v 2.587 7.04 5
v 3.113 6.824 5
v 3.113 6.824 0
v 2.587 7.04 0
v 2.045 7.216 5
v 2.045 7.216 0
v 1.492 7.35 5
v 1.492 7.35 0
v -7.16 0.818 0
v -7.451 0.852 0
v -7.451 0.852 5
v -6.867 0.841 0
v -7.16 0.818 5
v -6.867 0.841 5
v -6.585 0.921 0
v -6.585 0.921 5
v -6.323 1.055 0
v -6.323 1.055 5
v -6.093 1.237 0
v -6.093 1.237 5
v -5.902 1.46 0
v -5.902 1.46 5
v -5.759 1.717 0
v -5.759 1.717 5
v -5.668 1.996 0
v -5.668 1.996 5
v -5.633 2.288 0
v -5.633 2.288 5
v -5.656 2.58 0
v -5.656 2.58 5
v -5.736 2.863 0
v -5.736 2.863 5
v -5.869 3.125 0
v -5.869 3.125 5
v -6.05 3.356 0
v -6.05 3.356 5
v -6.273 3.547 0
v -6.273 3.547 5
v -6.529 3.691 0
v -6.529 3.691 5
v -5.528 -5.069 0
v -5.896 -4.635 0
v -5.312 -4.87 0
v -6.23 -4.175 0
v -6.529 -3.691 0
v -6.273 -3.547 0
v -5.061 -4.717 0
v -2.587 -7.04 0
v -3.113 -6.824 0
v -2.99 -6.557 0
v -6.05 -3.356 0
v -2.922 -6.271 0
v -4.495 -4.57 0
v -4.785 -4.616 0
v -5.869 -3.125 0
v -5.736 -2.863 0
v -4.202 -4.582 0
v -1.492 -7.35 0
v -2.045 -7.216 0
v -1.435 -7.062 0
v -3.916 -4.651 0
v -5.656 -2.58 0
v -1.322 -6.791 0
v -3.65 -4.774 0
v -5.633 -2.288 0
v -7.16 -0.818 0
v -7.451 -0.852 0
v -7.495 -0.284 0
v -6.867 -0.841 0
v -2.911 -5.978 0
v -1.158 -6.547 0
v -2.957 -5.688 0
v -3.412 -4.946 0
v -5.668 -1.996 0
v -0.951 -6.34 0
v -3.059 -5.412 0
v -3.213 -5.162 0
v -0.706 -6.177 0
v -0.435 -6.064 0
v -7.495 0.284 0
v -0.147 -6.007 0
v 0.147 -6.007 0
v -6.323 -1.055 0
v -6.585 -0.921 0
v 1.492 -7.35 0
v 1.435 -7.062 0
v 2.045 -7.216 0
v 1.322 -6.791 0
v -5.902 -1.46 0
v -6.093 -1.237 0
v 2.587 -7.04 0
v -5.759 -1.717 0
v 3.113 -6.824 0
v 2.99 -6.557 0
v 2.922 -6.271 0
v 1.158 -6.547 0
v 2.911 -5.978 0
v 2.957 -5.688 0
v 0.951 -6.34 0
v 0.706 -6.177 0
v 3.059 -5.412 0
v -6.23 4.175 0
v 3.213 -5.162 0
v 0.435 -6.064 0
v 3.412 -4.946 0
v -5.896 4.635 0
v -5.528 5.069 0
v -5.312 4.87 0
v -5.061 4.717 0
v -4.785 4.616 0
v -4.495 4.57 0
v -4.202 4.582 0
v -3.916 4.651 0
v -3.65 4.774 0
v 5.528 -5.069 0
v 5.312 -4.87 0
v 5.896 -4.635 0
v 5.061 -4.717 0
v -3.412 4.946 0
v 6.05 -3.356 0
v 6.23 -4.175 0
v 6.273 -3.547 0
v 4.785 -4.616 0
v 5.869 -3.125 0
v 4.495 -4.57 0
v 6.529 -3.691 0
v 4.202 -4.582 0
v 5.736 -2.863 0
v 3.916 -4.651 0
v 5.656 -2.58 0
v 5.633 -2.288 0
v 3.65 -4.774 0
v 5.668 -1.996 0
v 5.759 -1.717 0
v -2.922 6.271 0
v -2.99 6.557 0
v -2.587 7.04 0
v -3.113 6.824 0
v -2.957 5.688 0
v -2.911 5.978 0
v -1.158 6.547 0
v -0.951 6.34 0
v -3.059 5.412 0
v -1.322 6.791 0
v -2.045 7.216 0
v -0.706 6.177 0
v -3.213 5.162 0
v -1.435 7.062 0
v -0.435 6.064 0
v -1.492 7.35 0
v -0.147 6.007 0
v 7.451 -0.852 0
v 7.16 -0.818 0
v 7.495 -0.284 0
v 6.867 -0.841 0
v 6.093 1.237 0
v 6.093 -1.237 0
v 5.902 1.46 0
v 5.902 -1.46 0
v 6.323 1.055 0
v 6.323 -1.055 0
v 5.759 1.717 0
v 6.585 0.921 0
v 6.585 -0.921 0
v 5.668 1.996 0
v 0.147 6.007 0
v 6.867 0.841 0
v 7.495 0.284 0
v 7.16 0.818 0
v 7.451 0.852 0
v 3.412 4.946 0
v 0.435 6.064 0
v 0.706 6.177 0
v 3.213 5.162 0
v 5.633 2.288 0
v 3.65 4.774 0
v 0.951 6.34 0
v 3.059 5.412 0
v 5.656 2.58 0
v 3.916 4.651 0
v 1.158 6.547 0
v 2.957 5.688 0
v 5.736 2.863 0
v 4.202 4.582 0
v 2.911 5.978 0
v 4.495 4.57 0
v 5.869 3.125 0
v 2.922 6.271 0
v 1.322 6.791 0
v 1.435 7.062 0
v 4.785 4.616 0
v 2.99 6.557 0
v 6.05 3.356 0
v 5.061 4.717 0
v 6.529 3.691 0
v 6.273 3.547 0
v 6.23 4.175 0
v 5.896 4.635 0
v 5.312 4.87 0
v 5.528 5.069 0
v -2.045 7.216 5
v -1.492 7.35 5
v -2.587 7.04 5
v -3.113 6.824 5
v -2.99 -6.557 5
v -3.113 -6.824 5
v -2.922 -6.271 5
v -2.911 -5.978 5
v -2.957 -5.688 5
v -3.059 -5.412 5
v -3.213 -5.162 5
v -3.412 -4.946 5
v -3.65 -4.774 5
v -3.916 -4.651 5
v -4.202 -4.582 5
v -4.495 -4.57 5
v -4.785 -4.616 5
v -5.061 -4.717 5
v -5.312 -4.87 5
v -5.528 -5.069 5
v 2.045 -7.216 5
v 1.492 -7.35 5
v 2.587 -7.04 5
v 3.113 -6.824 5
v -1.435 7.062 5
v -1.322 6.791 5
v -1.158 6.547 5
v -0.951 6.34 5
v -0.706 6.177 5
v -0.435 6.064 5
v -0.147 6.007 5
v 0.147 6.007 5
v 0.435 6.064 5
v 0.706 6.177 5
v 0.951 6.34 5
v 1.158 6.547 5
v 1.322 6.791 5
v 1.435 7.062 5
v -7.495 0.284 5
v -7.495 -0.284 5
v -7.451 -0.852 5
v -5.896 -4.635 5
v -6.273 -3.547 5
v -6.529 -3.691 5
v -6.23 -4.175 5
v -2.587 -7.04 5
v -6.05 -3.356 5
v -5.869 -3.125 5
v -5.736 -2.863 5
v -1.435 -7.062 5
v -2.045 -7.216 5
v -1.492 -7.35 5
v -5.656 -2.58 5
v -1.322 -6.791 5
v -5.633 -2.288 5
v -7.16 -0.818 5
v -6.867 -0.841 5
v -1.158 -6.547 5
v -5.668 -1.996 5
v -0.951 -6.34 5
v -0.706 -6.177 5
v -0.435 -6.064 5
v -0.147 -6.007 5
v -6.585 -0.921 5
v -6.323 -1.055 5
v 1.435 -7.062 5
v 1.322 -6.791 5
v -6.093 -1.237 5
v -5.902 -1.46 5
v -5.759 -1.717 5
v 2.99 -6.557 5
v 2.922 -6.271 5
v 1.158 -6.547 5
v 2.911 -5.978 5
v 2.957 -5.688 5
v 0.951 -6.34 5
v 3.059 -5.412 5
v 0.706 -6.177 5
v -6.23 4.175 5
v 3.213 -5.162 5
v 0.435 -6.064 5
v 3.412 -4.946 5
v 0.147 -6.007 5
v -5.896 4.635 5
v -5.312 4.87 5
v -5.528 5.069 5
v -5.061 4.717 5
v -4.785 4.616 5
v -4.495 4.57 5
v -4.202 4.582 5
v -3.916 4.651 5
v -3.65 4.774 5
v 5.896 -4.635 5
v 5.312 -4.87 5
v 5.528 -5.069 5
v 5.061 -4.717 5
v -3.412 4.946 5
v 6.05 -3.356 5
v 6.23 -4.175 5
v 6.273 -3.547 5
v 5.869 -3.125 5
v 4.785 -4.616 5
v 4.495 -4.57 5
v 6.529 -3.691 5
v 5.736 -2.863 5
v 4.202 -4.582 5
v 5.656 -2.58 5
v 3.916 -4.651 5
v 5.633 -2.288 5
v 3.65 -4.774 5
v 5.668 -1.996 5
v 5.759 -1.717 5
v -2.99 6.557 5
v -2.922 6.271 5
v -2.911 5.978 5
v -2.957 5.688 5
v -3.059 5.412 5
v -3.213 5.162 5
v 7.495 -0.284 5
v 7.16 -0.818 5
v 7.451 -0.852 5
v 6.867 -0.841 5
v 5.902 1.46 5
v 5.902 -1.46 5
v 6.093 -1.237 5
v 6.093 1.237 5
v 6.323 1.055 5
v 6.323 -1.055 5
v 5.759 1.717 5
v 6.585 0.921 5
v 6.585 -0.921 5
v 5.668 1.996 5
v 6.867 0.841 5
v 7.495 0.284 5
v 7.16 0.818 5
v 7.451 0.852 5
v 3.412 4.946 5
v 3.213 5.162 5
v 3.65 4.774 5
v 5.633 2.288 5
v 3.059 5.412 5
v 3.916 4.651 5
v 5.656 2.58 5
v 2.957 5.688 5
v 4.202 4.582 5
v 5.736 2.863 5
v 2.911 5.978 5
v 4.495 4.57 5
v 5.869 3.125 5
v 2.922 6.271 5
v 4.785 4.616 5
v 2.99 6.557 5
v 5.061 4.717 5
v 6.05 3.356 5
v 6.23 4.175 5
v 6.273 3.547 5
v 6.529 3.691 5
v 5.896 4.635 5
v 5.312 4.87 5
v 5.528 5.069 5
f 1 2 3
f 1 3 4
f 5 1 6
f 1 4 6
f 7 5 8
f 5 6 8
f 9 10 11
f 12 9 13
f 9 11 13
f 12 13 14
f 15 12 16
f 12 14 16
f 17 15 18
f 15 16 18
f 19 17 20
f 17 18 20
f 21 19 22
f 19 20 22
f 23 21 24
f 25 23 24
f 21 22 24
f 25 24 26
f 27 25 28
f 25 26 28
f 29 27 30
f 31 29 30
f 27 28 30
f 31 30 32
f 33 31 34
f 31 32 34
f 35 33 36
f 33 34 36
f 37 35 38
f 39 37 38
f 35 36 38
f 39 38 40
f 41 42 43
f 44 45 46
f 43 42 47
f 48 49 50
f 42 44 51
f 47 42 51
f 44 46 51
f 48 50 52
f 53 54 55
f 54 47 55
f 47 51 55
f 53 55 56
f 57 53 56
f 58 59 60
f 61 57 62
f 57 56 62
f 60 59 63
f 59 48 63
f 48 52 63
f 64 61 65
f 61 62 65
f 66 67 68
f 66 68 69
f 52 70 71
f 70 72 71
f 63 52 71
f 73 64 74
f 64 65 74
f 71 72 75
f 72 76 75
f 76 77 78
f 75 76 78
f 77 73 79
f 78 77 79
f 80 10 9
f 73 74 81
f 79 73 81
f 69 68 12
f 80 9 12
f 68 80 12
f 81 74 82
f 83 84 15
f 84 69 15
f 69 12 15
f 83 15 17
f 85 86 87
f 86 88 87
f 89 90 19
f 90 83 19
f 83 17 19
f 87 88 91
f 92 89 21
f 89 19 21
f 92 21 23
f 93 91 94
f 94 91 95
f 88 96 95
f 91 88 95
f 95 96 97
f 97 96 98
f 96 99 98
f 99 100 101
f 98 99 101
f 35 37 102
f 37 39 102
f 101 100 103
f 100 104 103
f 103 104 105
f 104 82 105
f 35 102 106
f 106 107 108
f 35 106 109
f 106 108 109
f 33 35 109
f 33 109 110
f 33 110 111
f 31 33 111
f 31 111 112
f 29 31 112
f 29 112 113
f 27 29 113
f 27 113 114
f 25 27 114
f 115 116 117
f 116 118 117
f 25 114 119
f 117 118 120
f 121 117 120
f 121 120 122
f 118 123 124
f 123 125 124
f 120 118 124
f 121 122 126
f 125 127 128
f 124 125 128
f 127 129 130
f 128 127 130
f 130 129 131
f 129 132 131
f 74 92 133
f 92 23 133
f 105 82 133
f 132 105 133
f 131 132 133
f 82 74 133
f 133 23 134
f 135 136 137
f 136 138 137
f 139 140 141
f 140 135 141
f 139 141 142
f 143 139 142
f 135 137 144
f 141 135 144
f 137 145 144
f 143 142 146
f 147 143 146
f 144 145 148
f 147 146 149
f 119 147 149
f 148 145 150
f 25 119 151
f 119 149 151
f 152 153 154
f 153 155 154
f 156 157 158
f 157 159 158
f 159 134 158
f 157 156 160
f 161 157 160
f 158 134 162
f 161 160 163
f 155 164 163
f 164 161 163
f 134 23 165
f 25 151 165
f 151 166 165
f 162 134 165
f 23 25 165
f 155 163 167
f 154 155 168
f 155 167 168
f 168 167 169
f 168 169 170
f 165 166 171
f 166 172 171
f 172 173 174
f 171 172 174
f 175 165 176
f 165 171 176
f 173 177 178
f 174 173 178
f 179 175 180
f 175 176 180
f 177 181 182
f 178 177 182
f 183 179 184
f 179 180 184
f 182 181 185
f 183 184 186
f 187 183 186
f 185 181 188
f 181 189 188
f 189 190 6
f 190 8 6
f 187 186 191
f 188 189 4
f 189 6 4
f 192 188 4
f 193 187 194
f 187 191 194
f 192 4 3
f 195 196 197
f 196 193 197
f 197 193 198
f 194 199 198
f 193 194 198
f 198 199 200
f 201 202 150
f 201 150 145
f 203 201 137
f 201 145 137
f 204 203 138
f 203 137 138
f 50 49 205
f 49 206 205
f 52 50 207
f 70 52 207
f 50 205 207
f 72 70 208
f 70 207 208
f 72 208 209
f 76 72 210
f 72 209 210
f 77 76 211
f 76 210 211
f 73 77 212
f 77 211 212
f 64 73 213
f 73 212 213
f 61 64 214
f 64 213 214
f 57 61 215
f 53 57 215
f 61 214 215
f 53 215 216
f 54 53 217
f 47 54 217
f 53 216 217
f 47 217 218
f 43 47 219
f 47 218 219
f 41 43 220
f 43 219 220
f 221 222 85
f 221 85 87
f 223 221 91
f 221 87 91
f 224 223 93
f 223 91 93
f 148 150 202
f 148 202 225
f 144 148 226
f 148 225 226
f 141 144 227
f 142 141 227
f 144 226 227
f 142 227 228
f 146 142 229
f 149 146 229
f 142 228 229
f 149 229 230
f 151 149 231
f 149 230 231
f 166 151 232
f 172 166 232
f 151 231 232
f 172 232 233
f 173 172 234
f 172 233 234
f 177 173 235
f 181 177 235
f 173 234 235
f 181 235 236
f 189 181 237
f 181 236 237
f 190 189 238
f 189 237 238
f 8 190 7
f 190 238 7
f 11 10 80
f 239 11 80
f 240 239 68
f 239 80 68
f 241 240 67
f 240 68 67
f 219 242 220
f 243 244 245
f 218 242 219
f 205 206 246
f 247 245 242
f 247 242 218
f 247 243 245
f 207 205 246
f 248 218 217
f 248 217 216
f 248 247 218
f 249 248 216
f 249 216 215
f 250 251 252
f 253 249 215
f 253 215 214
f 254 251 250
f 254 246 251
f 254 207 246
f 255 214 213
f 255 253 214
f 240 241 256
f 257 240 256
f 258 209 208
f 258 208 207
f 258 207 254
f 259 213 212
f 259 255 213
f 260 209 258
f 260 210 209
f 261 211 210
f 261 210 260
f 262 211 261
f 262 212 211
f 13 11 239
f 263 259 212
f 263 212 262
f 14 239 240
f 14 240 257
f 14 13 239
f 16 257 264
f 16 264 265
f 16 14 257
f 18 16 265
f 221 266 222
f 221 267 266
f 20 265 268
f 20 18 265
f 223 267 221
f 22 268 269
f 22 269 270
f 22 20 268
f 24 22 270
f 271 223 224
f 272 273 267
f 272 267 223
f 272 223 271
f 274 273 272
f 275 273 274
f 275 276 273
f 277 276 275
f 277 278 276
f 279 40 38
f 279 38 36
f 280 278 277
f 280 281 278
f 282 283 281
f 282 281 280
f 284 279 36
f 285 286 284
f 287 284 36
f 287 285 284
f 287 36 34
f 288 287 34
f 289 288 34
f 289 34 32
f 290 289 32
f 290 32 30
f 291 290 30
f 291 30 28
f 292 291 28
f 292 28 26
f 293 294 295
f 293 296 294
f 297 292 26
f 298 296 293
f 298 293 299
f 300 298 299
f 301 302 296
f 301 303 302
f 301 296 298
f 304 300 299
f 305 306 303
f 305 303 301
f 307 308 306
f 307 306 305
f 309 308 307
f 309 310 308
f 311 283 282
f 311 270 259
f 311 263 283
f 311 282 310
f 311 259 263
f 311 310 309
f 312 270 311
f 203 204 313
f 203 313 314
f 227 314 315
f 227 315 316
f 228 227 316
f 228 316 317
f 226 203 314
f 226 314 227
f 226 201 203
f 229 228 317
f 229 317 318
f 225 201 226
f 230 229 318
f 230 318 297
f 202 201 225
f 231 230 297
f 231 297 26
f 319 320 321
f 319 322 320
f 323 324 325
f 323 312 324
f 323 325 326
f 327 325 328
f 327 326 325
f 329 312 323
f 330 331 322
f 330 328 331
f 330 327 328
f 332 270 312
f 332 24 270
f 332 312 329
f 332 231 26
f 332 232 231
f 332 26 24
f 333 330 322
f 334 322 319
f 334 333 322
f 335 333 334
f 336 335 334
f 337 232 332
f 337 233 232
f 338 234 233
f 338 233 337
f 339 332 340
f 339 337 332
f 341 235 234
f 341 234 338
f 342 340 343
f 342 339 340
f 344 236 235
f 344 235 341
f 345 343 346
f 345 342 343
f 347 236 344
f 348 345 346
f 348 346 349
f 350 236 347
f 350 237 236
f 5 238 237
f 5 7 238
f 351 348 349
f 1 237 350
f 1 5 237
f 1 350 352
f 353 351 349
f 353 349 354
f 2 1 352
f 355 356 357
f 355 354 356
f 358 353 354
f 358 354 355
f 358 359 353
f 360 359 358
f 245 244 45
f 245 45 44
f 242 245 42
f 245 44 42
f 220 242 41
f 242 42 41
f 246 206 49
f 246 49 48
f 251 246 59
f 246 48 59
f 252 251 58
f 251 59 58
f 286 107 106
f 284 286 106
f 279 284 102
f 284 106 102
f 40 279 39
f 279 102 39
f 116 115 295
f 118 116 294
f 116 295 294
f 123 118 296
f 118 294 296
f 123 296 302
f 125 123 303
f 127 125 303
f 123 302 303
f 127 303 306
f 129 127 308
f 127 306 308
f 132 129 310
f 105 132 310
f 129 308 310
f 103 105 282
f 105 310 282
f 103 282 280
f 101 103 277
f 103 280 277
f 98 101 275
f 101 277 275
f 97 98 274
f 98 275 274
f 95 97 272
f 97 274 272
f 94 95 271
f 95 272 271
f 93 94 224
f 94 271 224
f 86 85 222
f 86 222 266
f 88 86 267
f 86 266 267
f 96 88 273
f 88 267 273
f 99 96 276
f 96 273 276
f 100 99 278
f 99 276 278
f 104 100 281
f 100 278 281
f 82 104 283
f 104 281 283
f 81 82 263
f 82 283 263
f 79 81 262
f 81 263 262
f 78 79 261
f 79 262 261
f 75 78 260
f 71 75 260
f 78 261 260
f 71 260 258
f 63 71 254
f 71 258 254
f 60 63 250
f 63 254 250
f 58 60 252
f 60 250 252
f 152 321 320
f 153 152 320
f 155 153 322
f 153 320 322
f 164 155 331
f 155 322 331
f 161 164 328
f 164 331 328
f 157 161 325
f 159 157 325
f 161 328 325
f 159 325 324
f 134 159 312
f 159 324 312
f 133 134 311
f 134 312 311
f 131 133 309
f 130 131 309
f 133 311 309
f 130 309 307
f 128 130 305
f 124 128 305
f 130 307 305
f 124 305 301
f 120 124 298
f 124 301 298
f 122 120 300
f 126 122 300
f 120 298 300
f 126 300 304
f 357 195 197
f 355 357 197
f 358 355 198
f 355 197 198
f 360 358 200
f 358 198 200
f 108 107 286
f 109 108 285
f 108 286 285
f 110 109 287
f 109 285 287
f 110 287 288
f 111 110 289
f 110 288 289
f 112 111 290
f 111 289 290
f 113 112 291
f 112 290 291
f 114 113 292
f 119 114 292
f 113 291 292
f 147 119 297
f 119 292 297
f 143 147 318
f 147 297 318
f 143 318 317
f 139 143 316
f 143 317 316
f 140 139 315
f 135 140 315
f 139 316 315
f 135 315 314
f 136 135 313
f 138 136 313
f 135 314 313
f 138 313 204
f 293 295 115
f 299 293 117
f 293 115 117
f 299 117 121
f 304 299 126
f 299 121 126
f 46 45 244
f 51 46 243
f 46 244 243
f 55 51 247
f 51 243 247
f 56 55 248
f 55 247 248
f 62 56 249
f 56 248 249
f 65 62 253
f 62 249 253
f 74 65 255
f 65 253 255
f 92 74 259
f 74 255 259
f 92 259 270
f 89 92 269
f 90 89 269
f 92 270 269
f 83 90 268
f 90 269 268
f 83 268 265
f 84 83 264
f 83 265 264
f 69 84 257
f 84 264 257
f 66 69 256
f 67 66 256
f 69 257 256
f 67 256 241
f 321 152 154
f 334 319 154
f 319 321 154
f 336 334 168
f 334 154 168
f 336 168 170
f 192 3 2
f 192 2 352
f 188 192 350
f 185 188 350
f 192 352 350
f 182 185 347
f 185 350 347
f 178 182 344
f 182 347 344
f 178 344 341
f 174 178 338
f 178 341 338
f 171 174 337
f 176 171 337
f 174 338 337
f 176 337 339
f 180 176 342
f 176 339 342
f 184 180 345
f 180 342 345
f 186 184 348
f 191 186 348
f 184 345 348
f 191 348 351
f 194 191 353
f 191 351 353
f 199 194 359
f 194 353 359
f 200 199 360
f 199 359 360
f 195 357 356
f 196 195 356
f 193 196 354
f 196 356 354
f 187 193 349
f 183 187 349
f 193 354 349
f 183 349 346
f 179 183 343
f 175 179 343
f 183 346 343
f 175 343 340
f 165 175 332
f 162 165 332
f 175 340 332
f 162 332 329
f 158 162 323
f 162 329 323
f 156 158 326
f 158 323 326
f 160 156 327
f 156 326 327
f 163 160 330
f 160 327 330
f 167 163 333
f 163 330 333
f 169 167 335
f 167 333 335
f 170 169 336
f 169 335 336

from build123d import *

# Parameters (mm, degrees)
SKETCH1_R           = 7.5
BOSS_EXTRUDE1_DEPTH = 5
SKETCH3_R           = 1.5
CUT_EXTRUDE1_DEPTH  = 5


with BuildPart() as part:
    # Sketch1 → Boss-Extrude1 (new body)
    with BuildSketch(Plane.XY):
        Circle(SKETCH1_R)
    extrude(amount=BOSS_EXTRUDE1_DEPTH)

    # Sketch3 → Cut-Extrude1 (cut)
    with BuildSketch(Plane.XY.offset(5)):
        with Locations((0, 7.5)):
            Circle(SKETCH3_R)
        with Locations((4.408389392, 6.067627458)):
            Circle(SKETCH3_R)
        with Locations((7.132923872, 2.317627458)):
            Circle(SKETCH3_R)
        with Locations((7.132923872, -2.317627458)):
            Circle(SKETCH3_R)
        with Locations((4.408389392, -6.067627458)):
            Circle(SKETCH3_R)
        with Locations((0, -7.5)):
            Circle(SKETCH3_R)
        with Locations((-4.408389392, -6.067627458)):
            Circle(SKETCH3_R)
        with Locations((-7.132923872, -2.317627458)):
            Circle(SKETCH3_R)
        with Locations((-7.132923872, 2.317627458)):
            Circle(SKETCH3_R)
        with Locations((-4.408389392, 6.067627458)):
            Circle(SKETCH3_R)
    extrude(amount=-CUT_EXTRUDE1_DEPTH, mode=Mode.SUBTRACT)


solid = part.part
